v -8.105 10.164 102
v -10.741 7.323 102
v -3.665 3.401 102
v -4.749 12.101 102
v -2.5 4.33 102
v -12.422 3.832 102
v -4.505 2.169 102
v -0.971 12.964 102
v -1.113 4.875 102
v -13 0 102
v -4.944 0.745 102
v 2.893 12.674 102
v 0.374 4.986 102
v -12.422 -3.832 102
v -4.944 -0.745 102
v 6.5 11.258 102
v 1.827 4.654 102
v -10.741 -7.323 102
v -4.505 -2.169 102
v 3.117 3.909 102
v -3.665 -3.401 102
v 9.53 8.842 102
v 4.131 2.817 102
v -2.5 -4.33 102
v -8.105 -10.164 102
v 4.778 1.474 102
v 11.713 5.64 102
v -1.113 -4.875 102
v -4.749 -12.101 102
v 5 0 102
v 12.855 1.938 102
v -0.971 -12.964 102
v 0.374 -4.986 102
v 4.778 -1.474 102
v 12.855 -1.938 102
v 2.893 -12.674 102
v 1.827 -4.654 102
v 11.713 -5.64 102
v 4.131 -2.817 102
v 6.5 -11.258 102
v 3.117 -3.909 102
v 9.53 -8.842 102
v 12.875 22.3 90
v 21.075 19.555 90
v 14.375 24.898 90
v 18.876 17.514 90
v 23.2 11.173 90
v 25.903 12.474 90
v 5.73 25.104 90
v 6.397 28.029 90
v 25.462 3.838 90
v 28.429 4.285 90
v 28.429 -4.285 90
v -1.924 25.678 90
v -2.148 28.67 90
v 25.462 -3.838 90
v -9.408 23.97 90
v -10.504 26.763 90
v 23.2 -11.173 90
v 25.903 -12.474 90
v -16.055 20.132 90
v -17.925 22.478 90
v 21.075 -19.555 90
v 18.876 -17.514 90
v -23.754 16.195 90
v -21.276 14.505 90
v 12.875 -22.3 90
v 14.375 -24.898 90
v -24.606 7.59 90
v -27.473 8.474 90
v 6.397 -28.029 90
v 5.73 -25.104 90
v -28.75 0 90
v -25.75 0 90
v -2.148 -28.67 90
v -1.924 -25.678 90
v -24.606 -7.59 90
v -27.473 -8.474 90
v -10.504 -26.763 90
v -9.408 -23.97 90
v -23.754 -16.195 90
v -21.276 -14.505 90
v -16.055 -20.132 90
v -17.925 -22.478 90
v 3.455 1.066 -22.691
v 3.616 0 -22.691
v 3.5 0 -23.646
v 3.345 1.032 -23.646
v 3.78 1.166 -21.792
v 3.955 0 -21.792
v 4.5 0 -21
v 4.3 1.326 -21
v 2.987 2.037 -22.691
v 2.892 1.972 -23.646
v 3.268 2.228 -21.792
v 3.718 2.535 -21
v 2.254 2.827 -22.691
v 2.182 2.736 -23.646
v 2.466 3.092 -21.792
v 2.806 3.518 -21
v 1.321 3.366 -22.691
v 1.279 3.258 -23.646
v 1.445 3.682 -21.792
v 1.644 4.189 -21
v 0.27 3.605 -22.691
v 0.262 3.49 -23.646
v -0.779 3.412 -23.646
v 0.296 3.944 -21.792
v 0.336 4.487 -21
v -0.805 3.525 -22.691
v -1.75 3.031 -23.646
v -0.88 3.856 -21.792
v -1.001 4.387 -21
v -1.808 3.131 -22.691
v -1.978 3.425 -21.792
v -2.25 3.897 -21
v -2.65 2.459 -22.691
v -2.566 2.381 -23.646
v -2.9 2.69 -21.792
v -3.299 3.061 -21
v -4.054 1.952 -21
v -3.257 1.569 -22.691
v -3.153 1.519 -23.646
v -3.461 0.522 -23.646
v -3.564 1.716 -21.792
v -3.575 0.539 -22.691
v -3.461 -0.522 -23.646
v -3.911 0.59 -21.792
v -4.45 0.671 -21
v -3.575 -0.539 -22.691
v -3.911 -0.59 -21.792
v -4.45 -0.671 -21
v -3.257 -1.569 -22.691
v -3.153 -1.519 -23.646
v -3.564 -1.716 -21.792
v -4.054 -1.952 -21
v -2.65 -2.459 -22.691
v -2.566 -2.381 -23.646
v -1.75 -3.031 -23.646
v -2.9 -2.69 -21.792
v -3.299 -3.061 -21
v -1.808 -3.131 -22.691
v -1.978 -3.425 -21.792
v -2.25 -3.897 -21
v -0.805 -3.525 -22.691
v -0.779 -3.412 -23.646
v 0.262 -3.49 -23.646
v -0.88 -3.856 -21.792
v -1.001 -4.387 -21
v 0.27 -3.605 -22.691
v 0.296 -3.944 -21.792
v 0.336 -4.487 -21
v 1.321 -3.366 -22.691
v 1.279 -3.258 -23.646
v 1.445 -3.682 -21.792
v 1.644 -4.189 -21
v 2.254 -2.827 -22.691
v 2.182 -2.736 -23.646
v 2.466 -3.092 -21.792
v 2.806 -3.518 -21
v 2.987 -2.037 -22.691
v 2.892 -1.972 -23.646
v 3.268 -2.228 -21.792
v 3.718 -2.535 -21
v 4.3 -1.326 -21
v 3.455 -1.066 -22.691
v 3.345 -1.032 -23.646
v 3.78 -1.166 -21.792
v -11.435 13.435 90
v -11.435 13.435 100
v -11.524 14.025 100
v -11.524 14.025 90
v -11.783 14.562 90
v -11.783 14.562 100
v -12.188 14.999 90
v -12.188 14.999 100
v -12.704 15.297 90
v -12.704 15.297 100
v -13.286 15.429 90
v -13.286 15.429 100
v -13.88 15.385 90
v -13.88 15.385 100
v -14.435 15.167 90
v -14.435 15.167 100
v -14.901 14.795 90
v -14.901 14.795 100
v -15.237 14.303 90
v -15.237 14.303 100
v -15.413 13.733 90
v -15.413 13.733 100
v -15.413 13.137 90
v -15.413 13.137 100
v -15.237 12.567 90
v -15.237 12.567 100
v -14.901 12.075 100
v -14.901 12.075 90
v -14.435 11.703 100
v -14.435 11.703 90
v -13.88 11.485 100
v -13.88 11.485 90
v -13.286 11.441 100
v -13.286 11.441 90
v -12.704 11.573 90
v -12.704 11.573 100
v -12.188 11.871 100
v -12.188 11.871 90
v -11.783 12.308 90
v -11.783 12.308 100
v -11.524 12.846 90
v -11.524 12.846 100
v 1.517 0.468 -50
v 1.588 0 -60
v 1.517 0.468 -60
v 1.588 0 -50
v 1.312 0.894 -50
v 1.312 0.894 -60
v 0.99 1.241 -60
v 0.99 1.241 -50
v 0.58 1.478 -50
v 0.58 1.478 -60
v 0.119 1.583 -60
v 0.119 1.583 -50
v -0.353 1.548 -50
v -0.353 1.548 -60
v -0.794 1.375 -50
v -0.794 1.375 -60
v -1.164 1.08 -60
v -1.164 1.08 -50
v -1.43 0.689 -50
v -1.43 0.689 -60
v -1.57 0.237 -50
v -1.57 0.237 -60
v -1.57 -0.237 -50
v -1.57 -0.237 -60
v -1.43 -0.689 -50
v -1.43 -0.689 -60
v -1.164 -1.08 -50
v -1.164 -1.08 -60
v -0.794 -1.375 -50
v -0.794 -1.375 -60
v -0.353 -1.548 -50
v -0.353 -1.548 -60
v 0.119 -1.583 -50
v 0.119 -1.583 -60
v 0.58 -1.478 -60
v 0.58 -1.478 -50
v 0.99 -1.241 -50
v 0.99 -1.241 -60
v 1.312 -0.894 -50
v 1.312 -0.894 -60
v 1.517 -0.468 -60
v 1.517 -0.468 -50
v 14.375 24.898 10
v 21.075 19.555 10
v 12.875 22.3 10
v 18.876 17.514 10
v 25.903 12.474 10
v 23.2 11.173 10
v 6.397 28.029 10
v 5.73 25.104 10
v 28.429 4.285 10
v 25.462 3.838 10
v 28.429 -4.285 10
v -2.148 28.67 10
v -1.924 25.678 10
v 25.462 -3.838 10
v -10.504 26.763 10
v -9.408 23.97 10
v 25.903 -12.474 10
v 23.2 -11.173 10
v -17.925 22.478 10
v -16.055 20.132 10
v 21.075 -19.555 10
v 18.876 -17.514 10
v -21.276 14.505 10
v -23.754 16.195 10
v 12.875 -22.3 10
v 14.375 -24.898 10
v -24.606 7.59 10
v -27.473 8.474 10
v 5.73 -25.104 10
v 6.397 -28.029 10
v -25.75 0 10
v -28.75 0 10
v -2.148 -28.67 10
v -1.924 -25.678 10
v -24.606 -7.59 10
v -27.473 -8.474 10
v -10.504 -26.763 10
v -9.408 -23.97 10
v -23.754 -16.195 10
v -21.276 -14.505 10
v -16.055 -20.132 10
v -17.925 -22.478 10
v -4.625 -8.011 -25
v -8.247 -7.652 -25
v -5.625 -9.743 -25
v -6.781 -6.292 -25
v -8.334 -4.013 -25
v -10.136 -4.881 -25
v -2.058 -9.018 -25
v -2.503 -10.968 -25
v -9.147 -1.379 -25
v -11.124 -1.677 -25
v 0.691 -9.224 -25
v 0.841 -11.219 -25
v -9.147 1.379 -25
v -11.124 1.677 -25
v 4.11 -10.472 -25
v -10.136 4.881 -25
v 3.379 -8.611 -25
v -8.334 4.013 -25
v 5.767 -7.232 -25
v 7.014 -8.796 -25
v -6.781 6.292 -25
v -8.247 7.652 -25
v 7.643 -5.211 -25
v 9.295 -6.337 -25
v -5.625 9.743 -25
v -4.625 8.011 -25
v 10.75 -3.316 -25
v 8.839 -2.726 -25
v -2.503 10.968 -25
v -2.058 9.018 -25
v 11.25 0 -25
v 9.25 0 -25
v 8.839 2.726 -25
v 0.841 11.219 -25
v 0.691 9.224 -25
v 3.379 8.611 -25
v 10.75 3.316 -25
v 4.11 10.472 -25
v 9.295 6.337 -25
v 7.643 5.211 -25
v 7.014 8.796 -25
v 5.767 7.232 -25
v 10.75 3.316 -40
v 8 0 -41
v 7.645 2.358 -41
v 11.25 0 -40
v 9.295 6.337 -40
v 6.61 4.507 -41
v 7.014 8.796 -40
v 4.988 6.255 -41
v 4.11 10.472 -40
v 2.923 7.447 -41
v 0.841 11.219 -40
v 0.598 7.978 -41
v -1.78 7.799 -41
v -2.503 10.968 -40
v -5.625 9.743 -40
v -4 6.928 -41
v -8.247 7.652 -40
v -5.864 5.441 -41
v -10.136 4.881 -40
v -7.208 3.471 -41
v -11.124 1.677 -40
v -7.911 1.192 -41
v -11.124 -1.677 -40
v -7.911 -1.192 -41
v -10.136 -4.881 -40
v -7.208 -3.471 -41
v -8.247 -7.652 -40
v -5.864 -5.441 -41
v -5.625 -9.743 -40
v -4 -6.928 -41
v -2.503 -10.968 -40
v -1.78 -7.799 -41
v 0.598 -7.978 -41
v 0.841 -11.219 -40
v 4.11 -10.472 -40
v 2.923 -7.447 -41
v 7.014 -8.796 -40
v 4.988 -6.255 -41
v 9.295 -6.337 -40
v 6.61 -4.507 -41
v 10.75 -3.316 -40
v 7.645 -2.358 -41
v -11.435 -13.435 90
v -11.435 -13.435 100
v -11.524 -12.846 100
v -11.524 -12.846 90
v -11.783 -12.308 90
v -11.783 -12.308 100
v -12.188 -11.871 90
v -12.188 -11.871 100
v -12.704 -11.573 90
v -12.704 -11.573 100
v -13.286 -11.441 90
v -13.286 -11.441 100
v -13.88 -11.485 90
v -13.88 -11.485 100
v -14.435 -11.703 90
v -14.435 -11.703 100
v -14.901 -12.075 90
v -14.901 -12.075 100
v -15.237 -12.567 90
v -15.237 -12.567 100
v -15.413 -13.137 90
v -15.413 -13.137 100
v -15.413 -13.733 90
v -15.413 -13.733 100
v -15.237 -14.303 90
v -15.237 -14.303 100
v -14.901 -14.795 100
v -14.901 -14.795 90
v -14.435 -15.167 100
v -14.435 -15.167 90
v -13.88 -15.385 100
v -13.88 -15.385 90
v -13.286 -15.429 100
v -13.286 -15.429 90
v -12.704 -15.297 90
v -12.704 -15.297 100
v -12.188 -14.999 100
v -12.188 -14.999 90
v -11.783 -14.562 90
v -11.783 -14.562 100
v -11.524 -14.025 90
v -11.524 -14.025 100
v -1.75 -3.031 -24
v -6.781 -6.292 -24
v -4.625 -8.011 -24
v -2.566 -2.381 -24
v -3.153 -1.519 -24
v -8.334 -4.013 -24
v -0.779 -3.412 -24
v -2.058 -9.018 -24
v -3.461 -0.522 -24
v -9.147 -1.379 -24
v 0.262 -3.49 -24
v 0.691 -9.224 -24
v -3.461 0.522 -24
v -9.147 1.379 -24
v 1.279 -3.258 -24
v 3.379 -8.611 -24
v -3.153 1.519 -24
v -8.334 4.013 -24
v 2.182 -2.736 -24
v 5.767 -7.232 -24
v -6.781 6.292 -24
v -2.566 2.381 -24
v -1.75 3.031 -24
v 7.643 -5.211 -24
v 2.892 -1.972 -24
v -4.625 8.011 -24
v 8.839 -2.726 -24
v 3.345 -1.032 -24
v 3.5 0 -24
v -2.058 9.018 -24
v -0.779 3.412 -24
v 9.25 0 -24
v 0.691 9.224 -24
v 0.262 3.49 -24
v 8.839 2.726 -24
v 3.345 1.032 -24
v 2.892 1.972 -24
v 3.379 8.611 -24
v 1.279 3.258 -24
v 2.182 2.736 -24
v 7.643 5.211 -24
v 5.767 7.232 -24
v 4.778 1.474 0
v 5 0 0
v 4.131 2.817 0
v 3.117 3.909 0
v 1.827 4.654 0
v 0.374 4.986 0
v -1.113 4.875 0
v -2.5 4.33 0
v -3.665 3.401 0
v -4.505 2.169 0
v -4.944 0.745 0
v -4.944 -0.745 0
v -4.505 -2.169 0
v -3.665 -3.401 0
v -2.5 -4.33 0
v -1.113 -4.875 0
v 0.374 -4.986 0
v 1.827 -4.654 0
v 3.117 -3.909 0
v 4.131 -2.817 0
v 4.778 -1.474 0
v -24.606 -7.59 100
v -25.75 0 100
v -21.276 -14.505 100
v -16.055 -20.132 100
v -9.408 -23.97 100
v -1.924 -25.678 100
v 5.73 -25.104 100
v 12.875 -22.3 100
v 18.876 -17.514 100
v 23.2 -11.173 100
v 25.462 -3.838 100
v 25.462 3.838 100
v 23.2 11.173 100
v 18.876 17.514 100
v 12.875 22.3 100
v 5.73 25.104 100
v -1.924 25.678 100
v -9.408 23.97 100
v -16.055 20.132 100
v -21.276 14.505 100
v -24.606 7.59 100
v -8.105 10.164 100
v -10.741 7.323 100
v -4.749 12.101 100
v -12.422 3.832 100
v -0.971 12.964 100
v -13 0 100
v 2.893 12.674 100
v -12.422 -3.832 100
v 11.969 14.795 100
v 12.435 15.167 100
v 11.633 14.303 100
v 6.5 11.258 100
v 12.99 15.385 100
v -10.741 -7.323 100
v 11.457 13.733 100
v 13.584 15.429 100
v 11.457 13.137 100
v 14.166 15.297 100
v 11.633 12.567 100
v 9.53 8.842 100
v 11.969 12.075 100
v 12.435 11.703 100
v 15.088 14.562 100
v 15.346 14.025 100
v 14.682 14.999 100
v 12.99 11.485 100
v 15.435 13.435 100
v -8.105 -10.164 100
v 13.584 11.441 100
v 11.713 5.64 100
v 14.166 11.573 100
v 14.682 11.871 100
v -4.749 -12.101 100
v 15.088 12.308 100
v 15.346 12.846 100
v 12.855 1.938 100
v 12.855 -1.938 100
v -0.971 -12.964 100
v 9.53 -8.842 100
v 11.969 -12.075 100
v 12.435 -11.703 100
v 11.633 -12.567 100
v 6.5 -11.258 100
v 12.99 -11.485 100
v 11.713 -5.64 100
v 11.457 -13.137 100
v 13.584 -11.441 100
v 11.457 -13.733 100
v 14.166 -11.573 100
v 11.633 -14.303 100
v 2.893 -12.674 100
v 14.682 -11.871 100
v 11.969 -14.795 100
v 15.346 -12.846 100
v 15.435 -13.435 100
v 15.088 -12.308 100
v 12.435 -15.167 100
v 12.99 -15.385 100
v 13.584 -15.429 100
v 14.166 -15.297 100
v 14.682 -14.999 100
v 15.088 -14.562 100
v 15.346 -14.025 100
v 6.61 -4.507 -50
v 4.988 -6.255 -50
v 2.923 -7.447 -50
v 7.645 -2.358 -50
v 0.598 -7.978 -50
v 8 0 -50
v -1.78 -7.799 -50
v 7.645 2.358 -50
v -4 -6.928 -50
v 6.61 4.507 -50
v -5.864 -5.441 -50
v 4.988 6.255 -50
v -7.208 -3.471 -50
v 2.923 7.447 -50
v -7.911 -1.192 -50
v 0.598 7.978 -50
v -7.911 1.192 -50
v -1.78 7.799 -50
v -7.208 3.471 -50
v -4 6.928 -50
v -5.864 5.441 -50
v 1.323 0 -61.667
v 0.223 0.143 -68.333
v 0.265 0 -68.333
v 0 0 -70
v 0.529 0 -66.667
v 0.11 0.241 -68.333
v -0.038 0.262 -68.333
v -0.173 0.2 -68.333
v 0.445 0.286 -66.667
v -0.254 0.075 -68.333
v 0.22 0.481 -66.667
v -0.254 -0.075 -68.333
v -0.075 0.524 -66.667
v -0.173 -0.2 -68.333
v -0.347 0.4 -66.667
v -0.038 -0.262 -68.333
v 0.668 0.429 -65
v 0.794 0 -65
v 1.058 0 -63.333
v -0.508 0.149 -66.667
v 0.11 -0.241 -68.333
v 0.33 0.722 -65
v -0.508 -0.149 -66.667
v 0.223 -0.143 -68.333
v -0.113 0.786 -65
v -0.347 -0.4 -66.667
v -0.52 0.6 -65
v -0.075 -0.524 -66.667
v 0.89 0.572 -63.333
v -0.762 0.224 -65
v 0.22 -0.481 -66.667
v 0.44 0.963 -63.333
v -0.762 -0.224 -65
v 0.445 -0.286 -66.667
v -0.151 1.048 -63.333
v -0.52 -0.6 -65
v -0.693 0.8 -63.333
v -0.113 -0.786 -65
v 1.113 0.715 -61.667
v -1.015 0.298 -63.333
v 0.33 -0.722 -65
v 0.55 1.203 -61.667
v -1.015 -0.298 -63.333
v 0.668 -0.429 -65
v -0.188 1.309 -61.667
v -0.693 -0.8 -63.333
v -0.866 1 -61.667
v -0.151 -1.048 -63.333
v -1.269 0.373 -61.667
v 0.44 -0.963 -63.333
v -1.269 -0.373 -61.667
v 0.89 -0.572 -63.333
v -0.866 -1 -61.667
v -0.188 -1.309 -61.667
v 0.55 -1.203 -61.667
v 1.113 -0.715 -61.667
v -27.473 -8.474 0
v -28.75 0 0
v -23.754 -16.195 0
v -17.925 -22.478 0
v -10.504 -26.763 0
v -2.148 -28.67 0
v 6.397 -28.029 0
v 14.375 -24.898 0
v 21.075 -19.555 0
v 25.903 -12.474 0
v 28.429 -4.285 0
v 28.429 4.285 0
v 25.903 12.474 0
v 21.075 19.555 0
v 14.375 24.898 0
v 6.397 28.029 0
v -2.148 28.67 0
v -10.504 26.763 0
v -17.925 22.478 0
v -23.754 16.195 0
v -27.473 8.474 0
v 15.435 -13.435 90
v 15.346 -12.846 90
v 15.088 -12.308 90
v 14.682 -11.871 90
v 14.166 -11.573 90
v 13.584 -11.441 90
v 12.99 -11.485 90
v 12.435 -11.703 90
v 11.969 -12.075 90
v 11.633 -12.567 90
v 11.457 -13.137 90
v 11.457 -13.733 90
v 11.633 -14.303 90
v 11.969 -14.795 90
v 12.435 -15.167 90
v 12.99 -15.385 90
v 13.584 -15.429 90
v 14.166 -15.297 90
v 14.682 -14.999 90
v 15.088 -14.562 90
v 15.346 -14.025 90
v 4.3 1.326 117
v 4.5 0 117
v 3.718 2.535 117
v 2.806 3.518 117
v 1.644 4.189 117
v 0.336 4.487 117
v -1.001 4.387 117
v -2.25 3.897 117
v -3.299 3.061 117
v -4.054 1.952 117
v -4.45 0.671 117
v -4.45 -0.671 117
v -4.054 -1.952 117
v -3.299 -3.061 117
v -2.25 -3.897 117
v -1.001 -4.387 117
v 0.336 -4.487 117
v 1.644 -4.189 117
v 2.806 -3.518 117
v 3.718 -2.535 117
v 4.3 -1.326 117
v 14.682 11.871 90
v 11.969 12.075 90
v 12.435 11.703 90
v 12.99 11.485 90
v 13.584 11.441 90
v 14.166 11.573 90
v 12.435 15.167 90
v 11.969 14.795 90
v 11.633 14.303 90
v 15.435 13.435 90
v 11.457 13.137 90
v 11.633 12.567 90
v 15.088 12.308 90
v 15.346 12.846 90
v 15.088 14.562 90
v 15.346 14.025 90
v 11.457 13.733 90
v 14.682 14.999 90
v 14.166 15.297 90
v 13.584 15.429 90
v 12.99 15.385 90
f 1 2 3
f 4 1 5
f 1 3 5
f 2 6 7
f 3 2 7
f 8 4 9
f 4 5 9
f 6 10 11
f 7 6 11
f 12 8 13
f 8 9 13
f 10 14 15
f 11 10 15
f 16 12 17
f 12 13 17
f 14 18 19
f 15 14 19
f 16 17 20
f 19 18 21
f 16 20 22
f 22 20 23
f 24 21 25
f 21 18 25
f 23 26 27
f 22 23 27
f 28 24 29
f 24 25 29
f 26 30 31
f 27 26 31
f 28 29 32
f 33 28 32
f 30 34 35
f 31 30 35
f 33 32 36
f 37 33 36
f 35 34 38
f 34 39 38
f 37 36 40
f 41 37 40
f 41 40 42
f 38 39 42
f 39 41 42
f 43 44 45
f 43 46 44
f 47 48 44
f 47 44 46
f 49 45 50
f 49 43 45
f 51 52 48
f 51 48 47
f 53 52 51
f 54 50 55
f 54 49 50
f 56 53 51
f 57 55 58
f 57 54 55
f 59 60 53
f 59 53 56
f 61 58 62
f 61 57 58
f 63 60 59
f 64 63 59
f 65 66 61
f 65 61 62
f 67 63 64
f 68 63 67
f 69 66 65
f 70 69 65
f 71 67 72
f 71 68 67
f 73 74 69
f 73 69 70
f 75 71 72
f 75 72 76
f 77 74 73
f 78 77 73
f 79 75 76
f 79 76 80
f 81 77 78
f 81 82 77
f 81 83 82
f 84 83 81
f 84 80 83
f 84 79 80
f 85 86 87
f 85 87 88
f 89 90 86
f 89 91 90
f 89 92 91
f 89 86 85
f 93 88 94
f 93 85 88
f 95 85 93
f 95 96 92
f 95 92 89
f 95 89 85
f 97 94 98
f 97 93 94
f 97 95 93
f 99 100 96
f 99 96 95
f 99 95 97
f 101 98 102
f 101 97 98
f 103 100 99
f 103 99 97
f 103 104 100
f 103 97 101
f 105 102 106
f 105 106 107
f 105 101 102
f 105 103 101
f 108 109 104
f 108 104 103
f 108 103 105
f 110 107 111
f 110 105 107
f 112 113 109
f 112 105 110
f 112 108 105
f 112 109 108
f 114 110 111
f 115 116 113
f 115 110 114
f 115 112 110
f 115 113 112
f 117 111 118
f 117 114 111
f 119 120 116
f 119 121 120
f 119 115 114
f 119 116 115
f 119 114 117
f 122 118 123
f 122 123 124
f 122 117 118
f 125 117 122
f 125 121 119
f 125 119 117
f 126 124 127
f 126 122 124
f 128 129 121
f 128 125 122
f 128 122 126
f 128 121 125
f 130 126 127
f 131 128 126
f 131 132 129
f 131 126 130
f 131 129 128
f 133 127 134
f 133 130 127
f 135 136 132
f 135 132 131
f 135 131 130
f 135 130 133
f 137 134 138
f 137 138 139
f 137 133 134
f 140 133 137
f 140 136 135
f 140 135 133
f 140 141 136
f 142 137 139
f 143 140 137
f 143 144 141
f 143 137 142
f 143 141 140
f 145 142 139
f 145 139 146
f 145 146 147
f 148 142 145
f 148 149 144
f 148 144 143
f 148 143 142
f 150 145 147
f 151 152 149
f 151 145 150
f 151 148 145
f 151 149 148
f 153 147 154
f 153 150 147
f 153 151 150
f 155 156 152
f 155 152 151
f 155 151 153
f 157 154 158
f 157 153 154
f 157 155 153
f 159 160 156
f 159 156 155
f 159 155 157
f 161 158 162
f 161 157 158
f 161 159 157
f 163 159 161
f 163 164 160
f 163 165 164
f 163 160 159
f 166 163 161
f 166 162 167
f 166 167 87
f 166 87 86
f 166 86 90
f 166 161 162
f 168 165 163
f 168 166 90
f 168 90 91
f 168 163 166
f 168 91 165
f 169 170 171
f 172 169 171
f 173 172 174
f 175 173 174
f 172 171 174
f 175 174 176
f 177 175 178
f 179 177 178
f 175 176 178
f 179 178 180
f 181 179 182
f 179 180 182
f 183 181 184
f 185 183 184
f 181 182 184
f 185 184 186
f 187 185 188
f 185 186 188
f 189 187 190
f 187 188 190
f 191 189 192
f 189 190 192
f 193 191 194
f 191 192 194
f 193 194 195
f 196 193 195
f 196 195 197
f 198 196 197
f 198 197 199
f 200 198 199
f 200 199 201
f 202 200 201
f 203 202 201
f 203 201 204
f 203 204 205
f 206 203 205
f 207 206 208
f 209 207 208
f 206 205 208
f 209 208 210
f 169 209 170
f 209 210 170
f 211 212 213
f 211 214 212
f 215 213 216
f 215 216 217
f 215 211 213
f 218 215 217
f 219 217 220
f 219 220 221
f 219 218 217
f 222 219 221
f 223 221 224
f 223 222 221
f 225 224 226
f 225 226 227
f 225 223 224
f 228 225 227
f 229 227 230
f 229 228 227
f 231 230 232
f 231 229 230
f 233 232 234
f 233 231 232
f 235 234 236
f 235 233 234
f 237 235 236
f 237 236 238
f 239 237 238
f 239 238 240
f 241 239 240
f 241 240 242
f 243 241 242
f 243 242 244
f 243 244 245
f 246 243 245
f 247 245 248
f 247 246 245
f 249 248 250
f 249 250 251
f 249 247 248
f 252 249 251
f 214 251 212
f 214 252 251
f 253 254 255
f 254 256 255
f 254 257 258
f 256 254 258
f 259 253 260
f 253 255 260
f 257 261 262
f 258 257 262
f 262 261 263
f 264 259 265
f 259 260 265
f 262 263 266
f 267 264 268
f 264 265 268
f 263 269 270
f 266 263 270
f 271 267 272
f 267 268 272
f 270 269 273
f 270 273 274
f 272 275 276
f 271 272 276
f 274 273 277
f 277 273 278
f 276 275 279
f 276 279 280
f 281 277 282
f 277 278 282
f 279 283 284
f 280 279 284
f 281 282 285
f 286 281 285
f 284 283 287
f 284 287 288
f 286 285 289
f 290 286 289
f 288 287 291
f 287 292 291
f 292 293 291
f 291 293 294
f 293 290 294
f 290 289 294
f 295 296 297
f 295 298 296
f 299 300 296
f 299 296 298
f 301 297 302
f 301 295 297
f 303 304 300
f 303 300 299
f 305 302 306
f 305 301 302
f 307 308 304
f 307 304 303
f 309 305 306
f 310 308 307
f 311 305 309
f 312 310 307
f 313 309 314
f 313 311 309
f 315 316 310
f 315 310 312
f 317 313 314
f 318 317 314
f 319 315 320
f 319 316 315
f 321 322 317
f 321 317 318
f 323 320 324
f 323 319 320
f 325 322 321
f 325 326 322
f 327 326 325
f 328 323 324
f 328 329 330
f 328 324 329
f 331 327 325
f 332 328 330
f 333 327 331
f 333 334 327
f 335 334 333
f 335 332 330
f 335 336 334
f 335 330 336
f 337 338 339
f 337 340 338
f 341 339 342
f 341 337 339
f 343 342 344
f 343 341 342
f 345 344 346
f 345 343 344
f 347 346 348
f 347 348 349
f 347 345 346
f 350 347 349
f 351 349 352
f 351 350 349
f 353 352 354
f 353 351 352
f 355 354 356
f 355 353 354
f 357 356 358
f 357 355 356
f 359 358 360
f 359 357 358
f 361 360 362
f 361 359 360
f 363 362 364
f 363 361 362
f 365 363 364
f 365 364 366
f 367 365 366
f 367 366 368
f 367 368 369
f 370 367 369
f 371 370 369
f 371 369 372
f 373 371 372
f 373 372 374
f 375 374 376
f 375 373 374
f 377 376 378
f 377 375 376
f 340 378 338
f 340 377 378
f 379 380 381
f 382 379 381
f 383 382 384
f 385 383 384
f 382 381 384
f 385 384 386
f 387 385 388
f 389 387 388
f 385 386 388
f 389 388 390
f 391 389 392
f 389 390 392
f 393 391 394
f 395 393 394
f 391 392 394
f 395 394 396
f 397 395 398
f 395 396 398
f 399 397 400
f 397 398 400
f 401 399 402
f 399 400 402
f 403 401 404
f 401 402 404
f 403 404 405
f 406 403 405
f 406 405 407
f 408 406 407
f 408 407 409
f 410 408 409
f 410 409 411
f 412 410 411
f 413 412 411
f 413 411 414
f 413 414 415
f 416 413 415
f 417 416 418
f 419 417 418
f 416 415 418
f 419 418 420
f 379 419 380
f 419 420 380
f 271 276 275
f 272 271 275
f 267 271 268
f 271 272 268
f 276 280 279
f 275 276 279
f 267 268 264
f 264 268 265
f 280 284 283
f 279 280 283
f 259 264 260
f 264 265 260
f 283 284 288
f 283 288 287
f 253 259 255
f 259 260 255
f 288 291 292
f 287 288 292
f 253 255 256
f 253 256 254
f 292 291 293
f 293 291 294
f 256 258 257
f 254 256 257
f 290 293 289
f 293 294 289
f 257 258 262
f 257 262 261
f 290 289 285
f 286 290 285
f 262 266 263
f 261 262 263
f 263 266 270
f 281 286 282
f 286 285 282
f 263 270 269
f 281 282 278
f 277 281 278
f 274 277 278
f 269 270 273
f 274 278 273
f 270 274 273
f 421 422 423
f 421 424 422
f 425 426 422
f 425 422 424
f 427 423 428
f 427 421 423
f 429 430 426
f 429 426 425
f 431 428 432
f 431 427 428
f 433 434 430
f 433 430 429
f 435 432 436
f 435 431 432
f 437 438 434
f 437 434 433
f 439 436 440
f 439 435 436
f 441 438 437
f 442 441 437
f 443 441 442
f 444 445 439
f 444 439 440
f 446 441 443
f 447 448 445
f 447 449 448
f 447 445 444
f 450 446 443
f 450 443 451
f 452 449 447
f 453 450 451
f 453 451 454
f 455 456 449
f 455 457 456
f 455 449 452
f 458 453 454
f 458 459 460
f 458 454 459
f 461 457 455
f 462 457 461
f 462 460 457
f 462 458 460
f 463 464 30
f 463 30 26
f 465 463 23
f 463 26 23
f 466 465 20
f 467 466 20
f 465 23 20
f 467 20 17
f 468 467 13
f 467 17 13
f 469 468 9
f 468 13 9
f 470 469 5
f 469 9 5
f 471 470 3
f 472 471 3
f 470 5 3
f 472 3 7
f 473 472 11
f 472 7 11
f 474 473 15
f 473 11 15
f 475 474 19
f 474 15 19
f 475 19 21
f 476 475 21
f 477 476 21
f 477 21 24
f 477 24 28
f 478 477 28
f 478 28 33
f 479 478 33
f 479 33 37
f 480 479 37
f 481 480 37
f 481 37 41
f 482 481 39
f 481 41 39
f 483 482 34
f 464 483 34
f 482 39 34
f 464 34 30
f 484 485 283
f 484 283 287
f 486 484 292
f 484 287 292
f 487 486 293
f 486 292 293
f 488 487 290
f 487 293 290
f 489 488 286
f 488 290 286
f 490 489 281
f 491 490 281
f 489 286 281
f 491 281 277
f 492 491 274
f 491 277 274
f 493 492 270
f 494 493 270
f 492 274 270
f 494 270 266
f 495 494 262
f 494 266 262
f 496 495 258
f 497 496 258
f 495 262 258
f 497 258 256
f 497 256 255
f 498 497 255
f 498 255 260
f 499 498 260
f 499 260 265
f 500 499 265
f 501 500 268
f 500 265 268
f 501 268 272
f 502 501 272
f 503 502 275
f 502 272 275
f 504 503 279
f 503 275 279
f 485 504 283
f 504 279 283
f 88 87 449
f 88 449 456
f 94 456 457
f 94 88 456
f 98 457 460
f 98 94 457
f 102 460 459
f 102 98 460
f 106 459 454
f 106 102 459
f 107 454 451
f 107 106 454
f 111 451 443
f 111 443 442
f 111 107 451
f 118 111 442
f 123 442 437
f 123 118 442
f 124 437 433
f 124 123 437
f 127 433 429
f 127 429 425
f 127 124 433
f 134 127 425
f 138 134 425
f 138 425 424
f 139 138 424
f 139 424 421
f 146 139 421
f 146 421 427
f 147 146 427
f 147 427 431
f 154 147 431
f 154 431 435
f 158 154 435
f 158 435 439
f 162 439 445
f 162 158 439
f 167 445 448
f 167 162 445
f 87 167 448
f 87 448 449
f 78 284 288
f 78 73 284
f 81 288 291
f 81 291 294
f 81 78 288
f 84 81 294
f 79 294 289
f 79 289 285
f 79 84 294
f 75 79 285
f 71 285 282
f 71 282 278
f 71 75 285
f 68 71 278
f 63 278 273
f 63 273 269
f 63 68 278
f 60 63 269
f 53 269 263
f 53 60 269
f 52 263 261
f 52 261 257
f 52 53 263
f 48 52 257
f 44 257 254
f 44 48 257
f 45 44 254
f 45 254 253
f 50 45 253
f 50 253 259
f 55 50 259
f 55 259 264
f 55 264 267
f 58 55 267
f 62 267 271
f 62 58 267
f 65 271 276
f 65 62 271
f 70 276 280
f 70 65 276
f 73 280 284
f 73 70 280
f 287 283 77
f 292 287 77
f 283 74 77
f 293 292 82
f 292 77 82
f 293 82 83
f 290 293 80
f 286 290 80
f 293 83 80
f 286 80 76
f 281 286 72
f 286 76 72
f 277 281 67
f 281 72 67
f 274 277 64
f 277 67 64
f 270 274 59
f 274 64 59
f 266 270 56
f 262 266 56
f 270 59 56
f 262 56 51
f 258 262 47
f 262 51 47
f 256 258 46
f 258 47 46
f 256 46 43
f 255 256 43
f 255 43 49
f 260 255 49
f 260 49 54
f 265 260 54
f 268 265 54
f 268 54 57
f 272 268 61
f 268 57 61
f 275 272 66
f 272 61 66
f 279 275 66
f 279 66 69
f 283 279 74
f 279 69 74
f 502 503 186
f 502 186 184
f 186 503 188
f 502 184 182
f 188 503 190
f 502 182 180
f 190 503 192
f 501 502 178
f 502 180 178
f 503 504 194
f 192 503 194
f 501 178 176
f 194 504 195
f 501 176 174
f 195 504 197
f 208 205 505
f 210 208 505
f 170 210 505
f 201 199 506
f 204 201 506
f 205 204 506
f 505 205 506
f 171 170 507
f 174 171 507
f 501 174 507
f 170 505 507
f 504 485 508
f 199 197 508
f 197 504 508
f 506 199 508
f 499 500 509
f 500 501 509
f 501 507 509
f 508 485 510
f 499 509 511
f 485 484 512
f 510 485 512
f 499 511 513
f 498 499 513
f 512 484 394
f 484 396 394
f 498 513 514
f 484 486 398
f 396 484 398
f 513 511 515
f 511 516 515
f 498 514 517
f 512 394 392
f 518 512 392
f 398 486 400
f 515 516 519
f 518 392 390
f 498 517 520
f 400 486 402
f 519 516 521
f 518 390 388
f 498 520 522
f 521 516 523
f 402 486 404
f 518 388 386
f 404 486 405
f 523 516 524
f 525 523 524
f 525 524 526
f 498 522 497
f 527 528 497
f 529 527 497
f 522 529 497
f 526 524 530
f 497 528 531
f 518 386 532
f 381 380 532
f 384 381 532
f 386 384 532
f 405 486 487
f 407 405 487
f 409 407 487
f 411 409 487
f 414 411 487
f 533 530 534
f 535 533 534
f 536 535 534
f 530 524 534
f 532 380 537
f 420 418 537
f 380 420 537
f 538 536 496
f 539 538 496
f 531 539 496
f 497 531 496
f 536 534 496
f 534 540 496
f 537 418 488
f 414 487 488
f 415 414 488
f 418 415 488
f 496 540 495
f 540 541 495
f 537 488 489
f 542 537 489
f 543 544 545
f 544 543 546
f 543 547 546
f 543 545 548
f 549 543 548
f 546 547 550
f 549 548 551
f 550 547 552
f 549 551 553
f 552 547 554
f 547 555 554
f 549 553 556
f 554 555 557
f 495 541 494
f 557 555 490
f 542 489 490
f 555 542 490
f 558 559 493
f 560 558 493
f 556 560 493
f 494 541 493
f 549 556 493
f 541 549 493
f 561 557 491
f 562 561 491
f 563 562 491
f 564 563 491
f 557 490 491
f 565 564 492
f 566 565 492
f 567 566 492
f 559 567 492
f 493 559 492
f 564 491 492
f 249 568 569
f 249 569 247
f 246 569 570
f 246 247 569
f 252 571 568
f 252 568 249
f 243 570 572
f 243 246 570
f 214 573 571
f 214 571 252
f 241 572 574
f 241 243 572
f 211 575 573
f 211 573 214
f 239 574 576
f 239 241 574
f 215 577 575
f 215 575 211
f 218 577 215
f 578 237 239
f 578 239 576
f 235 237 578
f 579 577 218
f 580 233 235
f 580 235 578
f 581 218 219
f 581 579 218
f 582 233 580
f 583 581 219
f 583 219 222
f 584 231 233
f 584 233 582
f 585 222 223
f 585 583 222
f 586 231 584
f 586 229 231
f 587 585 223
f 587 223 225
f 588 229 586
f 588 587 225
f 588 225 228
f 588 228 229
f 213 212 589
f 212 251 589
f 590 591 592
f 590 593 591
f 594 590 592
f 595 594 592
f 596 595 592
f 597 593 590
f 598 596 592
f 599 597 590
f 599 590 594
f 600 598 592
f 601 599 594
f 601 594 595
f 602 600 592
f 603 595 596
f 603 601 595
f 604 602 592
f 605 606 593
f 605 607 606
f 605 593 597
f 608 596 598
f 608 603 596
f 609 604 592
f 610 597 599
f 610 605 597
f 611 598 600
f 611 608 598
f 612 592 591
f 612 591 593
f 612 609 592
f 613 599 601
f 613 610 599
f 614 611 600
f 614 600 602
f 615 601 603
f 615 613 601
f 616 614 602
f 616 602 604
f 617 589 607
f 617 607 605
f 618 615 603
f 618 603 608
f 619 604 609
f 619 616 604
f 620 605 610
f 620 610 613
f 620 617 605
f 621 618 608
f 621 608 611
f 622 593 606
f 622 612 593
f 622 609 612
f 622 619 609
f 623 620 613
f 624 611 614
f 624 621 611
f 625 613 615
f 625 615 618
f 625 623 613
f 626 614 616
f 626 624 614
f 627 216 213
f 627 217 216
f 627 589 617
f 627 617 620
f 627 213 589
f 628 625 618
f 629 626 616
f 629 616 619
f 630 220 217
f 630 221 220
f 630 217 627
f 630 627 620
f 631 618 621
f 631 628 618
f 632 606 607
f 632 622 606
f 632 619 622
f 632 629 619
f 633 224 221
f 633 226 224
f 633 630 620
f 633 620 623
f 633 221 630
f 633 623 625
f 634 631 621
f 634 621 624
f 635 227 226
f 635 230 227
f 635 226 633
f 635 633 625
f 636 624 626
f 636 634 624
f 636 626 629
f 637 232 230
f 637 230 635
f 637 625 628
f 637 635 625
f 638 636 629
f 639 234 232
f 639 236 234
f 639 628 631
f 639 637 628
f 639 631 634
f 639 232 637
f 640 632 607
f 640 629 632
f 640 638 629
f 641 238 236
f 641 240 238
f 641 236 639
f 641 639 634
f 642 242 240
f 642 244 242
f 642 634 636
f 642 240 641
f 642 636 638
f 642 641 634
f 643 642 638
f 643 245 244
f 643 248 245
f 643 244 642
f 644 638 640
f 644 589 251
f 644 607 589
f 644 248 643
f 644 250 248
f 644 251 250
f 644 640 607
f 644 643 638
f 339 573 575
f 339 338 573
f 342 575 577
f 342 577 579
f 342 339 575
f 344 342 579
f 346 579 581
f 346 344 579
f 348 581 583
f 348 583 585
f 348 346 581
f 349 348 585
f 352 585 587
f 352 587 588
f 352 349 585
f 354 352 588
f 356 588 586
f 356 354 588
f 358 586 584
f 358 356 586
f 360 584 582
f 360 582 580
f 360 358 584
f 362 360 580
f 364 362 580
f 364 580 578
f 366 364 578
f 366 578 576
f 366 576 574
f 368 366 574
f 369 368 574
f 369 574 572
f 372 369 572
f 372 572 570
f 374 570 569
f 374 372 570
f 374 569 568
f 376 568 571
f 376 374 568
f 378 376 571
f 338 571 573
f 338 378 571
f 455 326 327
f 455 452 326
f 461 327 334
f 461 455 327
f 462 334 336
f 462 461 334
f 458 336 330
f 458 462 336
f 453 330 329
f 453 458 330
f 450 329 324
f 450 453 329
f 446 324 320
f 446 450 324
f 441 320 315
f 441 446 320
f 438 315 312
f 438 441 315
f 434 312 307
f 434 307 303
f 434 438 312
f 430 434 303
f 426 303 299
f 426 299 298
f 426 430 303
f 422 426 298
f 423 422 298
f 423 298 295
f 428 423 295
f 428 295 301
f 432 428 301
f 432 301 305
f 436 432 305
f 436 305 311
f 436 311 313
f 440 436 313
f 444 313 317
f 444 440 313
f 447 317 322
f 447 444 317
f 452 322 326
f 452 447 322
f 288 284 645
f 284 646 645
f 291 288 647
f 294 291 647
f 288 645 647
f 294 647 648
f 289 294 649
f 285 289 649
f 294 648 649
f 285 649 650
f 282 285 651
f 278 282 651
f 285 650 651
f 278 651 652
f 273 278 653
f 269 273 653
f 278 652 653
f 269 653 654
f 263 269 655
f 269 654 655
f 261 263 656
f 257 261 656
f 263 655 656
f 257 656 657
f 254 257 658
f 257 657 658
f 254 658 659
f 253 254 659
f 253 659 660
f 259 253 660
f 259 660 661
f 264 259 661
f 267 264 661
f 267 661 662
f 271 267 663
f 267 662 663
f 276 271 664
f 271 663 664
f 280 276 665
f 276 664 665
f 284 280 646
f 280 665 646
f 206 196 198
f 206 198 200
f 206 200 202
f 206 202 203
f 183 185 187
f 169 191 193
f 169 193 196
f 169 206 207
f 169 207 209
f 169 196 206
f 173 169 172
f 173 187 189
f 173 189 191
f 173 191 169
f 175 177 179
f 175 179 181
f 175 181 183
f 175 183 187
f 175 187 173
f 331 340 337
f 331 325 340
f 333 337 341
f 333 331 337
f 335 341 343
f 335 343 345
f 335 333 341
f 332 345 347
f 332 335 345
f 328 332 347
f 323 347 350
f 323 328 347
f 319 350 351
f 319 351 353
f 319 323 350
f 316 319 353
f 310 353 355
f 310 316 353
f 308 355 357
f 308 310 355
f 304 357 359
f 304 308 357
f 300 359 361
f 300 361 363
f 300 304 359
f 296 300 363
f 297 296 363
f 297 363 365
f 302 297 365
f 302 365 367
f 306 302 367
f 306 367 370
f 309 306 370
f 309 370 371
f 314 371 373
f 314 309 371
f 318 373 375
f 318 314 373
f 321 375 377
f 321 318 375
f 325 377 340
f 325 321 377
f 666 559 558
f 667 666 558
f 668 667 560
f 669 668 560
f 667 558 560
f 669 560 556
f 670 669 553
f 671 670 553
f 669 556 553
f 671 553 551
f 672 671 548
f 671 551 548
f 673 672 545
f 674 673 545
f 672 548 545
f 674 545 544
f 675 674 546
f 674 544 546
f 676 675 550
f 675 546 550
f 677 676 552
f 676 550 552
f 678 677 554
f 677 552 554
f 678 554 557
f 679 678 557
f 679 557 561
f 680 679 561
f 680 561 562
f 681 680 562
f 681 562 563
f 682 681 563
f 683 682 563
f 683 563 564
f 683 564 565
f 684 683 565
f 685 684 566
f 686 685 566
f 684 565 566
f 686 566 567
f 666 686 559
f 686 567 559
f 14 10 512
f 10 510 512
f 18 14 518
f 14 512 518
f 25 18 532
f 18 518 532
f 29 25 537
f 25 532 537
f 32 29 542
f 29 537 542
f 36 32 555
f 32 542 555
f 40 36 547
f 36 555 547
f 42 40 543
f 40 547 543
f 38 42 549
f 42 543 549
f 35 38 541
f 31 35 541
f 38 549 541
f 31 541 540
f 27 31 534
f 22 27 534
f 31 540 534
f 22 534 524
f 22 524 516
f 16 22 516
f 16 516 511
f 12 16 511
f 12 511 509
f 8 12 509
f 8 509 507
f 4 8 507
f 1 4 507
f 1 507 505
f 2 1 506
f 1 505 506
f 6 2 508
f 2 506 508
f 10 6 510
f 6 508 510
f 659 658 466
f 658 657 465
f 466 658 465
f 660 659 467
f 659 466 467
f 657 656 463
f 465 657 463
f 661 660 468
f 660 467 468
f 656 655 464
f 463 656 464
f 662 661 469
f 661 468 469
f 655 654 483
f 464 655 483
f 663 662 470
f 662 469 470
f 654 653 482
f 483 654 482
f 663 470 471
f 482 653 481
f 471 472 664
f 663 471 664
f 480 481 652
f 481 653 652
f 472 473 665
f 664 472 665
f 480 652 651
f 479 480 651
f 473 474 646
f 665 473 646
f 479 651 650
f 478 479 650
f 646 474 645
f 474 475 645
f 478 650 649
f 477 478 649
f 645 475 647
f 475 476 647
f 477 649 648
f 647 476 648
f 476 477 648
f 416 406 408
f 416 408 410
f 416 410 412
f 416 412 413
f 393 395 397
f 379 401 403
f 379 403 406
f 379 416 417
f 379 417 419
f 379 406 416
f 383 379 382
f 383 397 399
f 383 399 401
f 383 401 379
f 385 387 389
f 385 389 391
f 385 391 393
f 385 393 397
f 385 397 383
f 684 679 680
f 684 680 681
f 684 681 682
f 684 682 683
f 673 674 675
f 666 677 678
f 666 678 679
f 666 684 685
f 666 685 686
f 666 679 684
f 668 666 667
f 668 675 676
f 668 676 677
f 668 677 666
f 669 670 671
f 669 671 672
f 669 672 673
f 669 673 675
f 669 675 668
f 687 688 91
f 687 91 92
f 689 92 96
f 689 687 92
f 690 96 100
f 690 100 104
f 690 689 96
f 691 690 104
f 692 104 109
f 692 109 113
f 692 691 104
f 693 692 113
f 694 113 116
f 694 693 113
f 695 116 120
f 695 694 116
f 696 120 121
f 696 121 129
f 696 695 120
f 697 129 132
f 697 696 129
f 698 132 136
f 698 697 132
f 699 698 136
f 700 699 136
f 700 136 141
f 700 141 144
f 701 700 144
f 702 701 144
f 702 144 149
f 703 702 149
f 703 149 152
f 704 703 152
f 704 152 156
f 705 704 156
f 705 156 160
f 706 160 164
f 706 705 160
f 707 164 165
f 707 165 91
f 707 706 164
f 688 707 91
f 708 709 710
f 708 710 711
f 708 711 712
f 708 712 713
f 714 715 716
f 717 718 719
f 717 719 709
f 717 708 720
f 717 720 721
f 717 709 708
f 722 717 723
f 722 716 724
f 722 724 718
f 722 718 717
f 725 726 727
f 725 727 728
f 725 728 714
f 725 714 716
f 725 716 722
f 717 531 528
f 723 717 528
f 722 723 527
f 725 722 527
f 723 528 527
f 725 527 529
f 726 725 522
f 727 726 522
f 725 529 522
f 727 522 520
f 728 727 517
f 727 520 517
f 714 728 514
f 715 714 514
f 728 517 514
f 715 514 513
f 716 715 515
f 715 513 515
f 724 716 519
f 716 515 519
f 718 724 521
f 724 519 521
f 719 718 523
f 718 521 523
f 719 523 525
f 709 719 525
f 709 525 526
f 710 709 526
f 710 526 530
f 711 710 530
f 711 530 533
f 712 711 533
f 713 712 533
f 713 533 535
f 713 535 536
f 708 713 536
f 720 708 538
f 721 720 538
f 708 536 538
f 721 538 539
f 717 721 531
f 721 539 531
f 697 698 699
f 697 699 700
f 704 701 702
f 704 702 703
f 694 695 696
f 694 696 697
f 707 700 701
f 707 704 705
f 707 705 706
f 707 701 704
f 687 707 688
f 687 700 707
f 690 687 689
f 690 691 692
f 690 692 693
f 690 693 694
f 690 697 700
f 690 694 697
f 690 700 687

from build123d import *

# Parameters (mm, degrees)
F0_W      = 3
F0_H      = 80
F4_OFFSET = 0.5
F6_R      = 2
F7_DEPTH  = 10


# Not quite as in the source:
# - a fillet or chamfer that OpenCascade refuses, or shapes differently, is made with other operations: its cross-section is extruded or revolved along the edge and cut away or added


with BuildPart() as f1:
    # F0 (on Front) → F1 (revolve)
    with BuildSketch(Plane.XZ):
        Polygon((0, 100), (0, 102), (-13, 102), (-13, 100), (-25.75, 100), (-25.75, 90), (-25.75, 10), (-28.75, 10), (-28.75, 0), (-25.75, 0), (0, 0), align=None)
    revolve(axis=Axis((0, 0, 33.5), (0, 0, 1)))


with BuildPart() as f2:
    # F0 (on Front) → F2 (revolve)
    with BuildSketch(Plane.XZ):
        Polygon((4.5, 117), (0, 117), (0, 102), (0, 100), (0, 0), (0, -50), (1.5875, -50), (8, -50), (8, -41), (11.25, -40), (11.25, -25), (9.25, -25), (9.25, -24), (3.5, -24), (3.5, -21), (4.5, -21), align=None)
        Polygon((1.5875, -50), (0, -50), (0, -70), (1.5875, -60), align=None)
    revolve(axis=Axis((0, 0, 33.5), (0, 0, 1)))


with BuildPart() as f3:
    # F0 (on Front) → F3 (revolve)
    with BuildSketch(Plane.XZ):
        with Locations((-27.25, 50)):
            Rectangle(F0_W, F0_H)
    revolve(axis=Axis((0, 0, 33.5), (0, 0, 1)))


with BuildPart() as f1_1:
    add(f1.part)

    # F4: cut F2, made larger all round first
    f4_tool = offset(f2.part, amount=F4_OFFSET, kind=Kind.INTERSECTION, mode=Mode.PRIVATE)
    add(f4_tool, mode=Mode.SUBTRACT)

    # F6 (on face) → F7 (cut)
    with BuildSketch(Plane.XY.offset(100)):
        with Locations((-13.4350288425, 13.4350288425)):
            Circle(F6_R)
        with Locations((13.4350288425, 13.4350288425)):
            Circle(F6_R)
        with Locations((13.4350288425, -13.4350288425)):
            Circle(F6_R)
        with Locations((-13.4350288425, -13.4350288425)):
            Circle(F6_R)
    extrude(amount=-F7_DEPTH, mode=Mode.SUBTRACT)


with BuildPart() as f2_1:
    add(f2.part)

    # F5: fillet of radius 4 on 1 edges, made by hand

    # F5_s1 → F5_t2 (revolve)
    with BuildSketch(Plane.XZ):
        with BuildLine():
            ThreePointArc((3.5, -23.6457513111), (3.7583426132, -22.2315377487), (4.5, -21))
            Line((4.5, -21), (3.5, -21))
            Line((3.5, -21), (3.5, -23.6457513111))
        make_face()
    revolve(axis=Axis((0, 0, -21), (0, 0, 1)))


solid = Compound([f3.part, f1_1.part, f2_1.part])
